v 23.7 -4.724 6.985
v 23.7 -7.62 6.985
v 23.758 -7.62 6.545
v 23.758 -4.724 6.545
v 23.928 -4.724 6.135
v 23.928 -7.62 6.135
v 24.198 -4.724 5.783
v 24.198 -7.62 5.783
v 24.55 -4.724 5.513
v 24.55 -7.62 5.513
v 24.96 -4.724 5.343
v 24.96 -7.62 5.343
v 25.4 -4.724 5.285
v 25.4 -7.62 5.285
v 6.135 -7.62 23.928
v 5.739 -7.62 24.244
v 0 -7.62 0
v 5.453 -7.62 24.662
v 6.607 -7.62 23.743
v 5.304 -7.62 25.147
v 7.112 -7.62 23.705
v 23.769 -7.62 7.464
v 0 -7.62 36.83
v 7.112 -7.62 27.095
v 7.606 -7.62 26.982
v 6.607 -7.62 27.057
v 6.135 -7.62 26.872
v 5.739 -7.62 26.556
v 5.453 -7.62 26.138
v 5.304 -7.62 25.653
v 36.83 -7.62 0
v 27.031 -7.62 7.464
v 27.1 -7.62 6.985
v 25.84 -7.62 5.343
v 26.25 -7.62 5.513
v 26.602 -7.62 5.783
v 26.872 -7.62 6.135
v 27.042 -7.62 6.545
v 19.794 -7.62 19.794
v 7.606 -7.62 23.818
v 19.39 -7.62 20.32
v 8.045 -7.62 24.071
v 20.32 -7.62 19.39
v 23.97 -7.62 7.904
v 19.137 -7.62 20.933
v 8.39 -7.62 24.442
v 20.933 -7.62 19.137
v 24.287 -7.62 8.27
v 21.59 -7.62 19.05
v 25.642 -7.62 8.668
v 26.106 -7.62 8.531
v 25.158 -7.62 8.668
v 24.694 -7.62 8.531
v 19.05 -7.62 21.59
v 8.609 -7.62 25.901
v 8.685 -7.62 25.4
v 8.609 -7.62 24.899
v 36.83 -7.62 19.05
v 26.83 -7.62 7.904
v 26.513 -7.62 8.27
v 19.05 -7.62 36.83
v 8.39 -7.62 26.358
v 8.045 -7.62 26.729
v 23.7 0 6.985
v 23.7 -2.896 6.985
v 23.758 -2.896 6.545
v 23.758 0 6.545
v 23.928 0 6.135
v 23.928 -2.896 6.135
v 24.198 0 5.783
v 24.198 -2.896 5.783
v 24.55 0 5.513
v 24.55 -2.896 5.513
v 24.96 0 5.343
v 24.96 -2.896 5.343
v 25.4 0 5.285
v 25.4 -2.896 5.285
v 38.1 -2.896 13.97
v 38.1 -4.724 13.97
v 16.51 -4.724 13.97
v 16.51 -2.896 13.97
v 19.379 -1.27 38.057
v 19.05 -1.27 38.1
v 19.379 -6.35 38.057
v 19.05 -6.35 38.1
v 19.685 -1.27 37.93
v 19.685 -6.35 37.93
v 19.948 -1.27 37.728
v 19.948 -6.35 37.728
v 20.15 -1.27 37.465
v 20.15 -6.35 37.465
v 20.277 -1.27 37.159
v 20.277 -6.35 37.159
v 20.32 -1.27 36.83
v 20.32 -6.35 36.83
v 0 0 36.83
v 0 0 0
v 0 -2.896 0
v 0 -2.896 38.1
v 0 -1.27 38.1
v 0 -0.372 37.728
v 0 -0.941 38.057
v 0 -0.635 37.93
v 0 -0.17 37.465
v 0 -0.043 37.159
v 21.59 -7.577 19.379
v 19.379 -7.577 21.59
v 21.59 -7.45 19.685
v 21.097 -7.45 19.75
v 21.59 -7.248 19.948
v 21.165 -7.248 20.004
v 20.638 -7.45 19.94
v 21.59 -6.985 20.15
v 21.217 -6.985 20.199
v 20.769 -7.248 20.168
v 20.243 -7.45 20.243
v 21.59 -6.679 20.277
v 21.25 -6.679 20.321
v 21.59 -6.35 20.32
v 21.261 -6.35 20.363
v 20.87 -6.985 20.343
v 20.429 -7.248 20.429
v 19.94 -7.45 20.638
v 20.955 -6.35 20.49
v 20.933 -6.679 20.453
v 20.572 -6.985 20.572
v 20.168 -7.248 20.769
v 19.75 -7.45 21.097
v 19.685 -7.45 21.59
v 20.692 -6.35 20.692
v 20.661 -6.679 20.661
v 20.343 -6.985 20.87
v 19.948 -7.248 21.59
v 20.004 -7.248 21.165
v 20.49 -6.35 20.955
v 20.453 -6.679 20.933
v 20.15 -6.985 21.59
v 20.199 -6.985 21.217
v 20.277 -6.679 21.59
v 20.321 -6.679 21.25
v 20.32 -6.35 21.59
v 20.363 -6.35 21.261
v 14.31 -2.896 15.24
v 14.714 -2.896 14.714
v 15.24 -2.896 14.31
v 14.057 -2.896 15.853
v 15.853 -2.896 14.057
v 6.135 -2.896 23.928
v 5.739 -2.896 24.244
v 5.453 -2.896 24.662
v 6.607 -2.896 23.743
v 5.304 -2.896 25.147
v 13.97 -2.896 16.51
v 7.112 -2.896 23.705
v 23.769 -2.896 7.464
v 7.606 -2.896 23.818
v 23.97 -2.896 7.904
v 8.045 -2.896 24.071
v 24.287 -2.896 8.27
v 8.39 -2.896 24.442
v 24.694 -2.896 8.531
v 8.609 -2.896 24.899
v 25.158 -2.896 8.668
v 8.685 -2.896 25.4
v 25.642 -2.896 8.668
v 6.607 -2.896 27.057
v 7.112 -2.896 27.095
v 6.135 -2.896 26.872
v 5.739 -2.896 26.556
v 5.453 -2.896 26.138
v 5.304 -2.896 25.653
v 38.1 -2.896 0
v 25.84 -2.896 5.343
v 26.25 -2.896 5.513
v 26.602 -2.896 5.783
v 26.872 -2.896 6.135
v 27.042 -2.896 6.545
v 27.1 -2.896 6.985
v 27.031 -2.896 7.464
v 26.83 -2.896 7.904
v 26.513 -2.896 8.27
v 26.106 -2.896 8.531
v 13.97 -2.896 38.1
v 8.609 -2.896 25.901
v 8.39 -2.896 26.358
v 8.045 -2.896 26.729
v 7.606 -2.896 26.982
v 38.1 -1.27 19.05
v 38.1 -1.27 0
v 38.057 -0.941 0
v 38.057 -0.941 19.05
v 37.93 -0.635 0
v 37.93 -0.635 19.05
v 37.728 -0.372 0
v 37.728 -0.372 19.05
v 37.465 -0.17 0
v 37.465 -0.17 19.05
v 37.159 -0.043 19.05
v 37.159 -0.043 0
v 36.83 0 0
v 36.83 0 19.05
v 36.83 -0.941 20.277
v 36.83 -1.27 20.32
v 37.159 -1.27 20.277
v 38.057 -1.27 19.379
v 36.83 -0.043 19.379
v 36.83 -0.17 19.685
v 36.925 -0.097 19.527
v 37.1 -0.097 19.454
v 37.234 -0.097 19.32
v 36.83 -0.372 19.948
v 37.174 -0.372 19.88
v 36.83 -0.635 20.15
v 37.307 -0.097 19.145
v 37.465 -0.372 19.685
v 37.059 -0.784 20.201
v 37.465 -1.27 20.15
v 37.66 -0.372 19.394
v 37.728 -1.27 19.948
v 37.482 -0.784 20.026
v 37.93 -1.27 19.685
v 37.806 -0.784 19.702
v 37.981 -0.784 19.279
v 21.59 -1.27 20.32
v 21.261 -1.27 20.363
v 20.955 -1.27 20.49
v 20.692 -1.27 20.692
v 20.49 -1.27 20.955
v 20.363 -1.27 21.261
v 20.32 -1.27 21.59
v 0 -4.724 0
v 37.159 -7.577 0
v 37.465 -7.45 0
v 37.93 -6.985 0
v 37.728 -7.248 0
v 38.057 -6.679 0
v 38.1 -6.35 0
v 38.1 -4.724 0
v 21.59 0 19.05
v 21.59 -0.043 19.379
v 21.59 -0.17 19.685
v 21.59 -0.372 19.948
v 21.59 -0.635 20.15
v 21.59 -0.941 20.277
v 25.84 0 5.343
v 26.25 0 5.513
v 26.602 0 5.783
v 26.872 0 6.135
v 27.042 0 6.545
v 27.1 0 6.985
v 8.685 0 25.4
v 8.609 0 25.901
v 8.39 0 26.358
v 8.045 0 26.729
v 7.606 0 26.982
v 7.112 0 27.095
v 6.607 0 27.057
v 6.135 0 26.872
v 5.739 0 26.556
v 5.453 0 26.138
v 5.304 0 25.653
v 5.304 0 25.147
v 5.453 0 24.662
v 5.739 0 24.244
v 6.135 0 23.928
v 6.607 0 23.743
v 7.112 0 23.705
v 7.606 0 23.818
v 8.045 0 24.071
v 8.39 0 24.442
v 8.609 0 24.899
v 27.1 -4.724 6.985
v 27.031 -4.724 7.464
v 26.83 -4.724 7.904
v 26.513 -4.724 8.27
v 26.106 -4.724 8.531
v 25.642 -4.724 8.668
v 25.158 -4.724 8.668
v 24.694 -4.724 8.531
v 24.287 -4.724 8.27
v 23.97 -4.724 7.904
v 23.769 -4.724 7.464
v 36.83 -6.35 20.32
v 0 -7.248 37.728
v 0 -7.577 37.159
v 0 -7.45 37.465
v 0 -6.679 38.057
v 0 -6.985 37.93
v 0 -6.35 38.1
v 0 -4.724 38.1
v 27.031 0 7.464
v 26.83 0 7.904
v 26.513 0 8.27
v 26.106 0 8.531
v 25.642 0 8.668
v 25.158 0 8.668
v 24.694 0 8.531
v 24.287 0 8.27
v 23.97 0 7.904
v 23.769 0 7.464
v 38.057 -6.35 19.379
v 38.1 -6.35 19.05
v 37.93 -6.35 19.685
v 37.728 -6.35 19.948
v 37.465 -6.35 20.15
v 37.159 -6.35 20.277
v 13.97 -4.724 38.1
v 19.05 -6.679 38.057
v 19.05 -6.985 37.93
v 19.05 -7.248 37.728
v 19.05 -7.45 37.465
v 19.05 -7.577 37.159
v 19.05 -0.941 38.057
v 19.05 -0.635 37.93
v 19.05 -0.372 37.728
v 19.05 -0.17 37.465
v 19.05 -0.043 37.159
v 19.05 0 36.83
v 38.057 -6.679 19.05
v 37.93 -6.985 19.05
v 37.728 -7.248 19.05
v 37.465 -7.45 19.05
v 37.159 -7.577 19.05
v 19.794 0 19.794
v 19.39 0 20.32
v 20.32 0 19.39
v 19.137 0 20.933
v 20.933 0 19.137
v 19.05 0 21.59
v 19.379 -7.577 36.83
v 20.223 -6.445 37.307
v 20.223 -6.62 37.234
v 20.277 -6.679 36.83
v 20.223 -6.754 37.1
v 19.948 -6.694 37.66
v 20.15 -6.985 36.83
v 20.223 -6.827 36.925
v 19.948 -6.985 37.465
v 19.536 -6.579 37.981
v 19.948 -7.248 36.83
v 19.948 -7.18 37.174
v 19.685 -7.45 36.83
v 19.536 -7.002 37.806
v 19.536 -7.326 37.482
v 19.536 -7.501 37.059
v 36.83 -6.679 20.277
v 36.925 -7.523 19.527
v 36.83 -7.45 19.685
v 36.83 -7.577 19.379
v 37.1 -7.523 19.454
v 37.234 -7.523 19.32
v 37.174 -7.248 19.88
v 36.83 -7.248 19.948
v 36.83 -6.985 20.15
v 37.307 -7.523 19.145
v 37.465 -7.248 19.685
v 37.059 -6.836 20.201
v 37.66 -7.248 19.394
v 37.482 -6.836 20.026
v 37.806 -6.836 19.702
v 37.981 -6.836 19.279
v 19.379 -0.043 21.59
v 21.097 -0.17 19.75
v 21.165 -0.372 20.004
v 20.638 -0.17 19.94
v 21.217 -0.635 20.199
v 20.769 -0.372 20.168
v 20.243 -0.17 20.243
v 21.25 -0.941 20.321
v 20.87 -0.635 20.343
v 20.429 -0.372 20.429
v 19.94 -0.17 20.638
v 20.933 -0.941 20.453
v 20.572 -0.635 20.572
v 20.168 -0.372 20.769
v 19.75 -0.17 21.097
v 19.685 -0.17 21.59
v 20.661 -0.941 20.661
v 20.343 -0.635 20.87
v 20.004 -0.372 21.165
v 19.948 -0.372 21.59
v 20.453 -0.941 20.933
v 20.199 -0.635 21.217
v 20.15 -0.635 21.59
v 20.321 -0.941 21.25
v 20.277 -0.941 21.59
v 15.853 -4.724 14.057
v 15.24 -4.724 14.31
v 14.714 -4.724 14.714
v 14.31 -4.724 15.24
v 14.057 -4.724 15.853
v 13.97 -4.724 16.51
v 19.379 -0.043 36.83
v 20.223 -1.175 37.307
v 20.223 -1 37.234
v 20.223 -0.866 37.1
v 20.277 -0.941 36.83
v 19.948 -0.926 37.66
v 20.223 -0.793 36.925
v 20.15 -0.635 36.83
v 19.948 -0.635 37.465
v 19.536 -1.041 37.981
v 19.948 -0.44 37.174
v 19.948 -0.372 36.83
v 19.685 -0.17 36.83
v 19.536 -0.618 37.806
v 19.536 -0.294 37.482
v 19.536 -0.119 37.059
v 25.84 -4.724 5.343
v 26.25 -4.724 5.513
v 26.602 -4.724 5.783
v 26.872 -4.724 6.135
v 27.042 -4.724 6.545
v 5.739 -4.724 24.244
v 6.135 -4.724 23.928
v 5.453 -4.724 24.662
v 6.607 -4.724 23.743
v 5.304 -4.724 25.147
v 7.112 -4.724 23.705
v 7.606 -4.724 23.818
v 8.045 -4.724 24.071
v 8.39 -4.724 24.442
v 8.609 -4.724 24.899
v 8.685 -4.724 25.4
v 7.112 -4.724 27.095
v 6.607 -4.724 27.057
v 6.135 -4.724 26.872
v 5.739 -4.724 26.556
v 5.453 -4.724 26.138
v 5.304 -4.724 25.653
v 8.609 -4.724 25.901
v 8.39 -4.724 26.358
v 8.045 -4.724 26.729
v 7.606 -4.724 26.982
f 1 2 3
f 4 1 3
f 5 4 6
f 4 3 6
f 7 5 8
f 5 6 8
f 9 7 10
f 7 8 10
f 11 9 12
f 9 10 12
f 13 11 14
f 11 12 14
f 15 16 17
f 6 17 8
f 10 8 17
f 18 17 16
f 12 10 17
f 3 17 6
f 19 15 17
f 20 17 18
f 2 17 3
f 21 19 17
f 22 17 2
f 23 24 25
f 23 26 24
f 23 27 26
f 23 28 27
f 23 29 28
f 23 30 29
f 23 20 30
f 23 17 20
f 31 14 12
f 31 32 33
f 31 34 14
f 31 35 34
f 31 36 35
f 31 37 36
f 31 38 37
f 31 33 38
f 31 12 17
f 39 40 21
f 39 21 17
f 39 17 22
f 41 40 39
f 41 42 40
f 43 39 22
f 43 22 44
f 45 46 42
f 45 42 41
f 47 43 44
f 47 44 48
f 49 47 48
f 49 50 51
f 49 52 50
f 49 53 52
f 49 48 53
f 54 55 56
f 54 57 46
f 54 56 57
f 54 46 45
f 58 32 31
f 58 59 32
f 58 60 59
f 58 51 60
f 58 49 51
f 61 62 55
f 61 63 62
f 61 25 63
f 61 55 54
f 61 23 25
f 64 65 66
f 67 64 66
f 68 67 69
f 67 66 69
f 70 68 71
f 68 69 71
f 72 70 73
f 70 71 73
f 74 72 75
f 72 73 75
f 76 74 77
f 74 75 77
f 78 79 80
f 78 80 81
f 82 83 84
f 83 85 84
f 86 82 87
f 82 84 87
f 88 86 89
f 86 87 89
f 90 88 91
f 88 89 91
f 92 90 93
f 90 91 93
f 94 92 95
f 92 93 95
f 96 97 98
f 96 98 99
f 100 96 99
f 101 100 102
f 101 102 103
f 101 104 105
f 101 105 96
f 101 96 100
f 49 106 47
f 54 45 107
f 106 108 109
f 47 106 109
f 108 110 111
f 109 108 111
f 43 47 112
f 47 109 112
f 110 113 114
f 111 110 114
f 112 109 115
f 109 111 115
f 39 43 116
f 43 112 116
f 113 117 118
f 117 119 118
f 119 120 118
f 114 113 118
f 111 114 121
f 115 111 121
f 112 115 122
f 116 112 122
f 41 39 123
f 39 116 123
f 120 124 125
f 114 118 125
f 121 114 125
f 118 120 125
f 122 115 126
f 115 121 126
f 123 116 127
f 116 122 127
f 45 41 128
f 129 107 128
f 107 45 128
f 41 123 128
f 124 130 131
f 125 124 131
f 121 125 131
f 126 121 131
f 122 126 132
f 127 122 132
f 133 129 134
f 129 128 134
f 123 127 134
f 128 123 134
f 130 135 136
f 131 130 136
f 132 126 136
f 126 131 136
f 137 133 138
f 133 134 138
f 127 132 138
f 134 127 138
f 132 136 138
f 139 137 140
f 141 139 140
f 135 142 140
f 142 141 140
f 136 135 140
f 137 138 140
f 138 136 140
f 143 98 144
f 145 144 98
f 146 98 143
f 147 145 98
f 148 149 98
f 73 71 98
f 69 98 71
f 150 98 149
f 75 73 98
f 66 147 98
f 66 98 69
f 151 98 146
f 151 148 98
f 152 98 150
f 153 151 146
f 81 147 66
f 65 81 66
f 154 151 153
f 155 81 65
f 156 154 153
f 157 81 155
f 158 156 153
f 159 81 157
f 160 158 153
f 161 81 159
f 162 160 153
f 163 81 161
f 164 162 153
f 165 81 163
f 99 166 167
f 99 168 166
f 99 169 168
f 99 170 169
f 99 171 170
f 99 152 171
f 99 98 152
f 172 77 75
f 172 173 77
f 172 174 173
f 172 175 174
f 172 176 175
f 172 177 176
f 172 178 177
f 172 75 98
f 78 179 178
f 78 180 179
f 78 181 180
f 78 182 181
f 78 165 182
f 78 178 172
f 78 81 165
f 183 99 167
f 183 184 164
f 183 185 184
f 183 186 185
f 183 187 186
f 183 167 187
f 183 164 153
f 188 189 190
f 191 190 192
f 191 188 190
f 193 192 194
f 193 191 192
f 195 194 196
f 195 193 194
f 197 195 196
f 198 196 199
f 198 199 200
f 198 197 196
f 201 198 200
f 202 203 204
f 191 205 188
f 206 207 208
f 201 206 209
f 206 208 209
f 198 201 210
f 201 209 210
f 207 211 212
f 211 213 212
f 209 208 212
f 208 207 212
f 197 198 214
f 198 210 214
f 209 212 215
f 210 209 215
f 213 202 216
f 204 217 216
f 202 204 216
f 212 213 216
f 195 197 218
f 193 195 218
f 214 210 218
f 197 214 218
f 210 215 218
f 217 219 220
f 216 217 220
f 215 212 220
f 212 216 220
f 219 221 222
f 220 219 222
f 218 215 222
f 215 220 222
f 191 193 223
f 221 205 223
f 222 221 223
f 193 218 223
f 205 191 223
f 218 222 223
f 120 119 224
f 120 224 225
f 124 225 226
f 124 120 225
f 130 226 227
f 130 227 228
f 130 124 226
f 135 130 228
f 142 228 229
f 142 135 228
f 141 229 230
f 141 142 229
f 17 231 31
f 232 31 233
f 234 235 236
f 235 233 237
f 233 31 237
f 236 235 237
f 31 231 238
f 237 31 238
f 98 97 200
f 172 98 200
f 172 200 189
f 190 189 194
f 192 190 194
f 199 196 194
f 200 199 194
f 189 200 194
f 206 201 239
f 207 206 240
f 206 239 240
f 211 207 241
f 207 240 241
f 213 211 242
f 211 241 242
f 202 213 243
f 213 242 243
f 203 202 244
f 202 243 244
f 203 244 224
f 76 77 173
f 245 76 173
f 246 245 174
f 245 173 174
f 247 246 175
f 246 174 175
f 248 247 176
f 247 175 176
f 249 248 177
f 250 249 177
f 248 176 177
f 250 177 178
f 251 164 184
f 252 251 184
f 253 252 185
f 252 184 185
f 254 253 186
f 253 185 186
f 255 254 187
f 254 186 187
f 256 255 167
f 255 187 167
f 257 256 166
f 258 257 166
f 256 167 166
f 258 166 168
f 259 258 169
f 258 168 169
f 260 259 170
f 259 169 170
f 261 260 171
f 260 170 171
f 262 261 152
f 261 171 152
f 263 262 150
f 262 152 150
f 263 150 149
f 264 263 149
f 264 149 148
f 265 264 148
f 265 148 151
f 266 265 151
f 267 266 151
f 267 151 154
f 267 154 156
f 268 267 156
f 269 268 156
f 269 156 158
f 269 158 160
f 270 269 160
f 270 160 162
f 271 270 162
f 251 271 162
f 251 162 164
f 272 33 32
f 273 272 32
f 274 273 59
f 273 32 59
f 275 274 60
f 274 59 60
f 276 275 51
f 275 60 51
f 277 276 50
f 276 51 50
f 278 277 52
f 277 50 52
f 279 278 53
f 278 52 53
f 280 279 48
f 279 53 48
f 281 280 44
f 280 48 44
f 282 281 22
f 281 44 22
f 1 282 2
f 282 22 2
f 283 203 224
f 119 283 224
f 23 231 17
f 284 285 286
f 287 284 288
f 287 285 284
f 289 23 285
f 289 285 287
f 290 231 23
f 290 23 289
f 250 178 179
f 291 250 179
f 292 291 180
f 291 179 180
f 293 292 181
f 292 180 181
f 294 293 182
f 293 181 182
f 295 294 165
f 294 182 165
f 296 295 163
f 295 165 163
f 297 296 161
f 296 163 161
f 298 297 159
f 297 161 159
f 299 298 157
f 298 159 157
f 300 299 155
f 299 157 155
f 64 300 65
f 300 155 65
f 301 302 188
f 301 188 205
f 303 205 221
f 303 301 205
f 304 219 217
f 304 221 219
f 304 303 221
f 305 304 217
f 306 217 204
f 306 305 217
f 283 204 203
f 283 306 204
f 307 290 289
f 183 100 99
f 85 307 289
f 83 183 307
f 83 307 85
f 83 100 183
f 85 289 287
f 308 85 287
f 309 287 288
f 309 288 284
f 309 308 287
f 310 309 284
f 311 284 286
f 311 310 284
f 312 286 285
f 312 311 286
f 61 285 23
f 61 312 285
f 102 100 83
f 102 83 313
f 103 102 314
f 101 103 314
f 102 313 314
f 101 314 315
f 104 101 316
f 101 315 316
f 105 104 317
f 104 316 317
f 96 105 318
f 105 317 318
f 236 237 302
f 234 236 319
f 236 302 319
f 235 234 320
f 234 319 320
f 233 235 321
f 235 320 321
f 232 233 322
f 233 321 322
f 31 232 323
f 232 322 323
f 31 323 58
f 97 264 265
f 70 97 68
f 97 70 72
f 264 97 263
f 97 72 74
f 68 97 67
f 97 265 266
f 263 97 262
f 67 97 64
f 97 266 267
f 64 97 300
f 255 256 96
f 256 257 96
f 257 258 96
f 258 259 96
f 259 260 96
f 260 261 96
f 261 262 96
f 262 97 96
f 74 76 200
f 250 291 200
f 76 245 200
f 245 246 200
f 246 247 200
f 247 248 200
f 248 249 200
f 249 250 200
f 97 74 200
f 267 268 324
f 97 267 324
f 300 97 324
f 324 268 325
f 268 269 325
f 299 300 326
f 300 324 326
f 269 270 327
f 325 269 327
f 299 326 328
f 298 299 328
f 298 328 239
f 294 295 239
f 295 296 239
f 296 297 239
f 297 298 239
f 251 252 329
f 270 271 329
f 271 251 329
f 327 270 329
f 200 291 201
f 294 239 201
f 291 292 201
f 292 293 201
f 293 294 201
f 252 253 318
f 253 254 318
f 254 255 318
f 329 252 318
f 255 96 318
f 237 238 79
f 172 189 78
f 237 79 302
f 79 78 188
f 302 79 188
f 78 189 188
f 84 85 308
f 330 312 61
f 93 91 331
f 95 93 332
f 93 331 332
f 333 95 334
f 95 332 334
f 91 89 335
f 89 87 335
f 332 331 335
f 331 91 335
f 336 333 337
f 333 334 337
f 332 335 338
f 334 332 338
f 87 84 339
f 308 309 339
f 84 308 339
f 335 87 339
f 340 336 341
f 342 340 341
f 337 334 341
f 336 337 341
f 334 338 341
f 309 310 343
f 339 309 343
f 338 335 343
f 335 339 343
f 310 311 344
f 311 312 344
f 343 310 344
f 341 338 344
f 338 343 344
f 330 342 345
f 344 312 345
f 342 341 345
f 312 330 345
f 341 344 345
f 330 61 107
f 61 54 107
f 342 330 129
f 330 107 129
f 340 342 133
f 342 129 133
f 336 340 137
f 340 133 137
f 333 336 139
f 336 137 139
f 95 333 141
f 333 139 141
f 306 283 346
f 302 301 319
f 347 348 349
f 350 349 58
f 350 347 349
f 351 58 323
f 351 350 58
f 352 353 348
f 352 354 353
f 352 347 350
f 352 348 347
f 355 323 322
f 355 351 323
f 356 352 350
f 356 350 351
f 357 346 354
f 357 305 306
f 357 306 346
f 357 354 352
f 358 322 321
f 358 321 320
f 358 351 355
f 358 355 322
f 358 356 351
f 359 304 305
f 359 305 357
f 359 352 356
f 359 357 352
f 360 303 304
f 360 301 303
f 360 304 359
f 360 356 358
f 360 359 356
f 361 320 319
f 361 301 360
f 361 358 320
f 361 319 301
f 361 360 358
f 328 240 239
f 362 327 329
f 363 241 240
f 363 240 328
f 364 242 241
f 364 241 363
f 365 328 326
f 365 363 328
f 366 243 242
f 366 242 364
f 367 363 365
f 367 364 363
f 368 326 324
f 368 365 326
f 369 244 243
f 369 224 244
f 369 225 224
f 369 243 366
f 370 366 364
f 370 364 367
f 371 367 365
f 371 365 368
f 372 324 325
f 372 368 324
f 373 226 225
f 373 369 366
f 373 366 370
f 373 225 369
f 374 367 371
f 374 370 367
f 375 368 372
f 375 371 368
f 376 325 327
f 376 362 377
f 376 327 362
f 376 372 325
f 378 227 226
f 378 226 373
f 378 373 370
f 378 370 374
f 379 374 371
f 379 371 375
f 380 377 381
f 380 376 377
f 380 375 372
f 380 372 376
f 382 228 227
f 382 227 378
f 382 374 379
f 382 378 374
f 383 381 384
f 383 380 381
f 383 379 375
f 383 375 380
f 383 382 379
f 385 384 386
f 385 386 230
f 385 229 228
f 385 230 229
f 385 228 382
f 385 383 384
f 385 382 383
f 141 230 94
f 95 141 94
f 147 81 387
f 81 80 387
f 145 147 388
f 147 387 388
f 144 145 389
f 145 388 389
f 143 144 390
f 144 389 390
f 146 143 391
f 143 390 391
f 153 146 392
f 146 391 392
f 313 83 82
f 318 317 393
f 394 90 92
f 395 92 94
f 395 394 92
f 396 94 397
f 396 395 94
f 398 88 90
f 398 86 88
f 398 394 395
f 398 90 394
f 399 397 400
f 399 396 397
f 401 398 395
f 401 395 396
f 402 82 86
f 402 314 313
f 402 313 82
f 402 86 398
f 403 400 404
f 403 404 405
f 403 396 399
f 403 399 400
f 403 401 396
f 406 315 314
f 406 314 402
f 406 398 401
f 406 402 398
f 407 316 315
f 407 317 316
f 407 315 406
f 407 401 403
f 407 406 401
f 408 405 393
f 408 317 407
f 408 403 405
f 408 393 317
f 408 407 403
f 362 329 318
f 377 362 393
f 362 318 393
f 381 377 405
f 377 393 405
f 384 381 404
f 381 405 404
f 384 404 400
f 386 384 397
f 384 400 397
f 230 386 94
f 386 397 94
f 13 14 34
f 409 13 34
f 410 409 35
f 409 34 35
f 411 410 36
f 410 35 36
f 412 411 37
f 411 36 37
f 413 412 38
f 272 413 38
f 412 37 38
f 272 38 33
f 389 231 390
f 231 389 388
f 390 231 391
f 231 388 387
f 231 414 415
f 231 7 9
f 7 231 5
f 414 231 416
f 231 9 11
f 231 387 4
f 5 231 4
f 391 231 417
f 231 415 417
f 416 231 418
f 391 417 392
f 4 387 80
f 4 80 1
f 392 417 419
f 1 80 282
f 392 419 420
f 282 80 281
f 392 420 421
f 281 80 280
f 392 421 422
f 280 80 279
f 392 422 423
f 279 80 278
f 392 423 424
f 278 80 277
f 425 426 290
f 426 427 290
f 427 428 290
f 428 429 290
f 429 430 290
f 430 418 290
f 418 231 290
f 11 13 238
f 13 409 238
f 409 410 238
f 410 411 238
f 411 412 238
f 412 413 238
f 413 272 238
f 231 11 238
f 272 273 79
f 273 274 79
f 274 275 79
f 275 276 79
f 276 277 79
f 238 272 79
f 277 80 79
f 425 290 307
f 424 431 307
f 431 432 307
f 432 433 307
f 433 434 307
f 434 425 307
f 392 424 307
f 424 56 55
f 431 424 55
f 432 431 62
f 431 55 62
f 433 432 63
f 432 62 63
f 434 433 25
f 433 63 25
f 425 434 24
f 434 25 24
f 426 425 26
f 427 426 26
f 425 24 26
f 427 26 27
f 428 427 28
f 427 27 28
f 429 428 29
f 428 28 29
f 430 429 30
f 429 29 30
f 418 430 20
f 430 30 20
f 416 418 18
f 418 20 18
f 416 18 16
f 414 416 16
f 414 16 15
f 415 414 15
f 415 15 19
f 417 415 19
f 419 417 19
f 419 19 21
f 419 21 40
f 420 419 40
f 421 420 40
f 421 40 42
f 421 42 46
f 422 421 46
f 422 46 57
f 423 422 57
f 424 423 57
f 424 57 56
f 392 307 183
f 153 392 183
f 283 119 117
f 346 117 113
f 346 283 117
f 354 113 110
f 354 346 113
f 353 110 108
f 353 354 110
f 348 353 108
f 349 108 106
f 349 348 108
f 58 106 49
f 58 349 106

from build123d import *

# Parameters (mm, degrees)
F0_W      = 38.1
F0_H      = 38.1
F1_DEPTH  = 7.62
F2_W      = 1.8288
F2_H      = 13.97
F3_DEPTH  = 38.101
F4_W      = 13.97
F4_H      = 1.8288
F5_DEPTH  = 38.101
F6_W      = 17.78
F6_H      = 17.78
F7_DEPTH  = 7.621
F8_R      = 2.54
F9_R      = 1.7
F10_DEPTH = 7.621
F11_R     = 1.27


with BuildPart() as f1:
    # F0 (on Front) → F1 (new body)
    with BuildSketch(Plane.XZ):
        with Locations((19.05, 19.05)):
            Rectangle(F0_W, F0_H)
    extrude(amount=F1_DEPTH)

    # F2 (on face) → F3 (cut, through all)
    with BuildSketch(Plane.YZ.offset(38.1)):
        with Locations((-3.81, 6.985)):
            Rectangle(F2_W, F2_H)
    extrude(amount=-F3_DEPTH, mode=Mode.SUBTRACT)

    # F4 (on face) → F5 (cut, through all)
    with BuildSketch(Plane.XY.offset(38.1)):
        with Locations((6.985, -3.81)):
            Rectangle(F4_W, F4_H)
    extrude(amount=-F5_DEPTH, mode=Mode.SUBTRACT)

    # F6 (on face) → F7 (cut, through all)
    with BuildSketch(Plane(origin=(0, 0, 0), x_dir=(-1, 0, 0), z_dir=(0, 1, 0))):
        with Locations((-29.21, 29.21)):
            Rectangle(F6_W, F6_H)
    extrude(amount=-F7_DEPTH, mode=Mode.SUBTRACT)

    # F8
    f8_edges = [f1.edges().sort_by_distance(p)[0] for p in [
        (13.97, -3.81, 13.97),
    ]]
    fillet(f8_edges, radius=F8_R)

    # F9 (on face) → F10 (cut, through all)
    with BuildSketch(Plane.XZ.offset(7.62)):
        with Locations((6.985, 25.4)):
            Circle(F9_R)
        with BuildLine():
            ThreePointArc((23.7, 6.985), (24.197918472, 5.782918472), (25.4, 5.285))
            Line((25.4, 5.285), (25.4, 6.985))
            Line((25.4, 6.985), (23.7, 6.985))
        make_face()
        with BuildLine():
            Line((25.4, 6.985), (25.4, 5.285))
            ThreePointArc((25.4, 5.285), (26.602081528, 5.782918472), (27.1, 6.985))
            ThreePointArc((27.1, 6.985), (25.4, 8.685), (23.7, 6.985))
            Line((23.7, 6.985), (25.4, 6.985))
        make_face()
    extrude(amount=-F10_DEPTH, mode=Mode.SUBTRACT)

    # F11
    f11_edges = [f1.edges().sort_by_distance(p)[0] for p in [
        (10.16, 0, 38.1),
        (10.16, -7.62, 38.1),
        (20.32, -3.81, 38.1),
        (20.32, 0, 29.21),
        (20.32, -7.62, 29.21),
        (20.32, -3.81, 20.32),
        (38.1, -3.81, 20.32),
        (29.21, 0, 20.32),
        (29.21, -7.62, 20.32),
        (38.1, 0, 10.16),
        (38.1, -7.62, 10.16),
    ]]
    fillet(f11_edges, radius=F11_R)


solid = f1.part
